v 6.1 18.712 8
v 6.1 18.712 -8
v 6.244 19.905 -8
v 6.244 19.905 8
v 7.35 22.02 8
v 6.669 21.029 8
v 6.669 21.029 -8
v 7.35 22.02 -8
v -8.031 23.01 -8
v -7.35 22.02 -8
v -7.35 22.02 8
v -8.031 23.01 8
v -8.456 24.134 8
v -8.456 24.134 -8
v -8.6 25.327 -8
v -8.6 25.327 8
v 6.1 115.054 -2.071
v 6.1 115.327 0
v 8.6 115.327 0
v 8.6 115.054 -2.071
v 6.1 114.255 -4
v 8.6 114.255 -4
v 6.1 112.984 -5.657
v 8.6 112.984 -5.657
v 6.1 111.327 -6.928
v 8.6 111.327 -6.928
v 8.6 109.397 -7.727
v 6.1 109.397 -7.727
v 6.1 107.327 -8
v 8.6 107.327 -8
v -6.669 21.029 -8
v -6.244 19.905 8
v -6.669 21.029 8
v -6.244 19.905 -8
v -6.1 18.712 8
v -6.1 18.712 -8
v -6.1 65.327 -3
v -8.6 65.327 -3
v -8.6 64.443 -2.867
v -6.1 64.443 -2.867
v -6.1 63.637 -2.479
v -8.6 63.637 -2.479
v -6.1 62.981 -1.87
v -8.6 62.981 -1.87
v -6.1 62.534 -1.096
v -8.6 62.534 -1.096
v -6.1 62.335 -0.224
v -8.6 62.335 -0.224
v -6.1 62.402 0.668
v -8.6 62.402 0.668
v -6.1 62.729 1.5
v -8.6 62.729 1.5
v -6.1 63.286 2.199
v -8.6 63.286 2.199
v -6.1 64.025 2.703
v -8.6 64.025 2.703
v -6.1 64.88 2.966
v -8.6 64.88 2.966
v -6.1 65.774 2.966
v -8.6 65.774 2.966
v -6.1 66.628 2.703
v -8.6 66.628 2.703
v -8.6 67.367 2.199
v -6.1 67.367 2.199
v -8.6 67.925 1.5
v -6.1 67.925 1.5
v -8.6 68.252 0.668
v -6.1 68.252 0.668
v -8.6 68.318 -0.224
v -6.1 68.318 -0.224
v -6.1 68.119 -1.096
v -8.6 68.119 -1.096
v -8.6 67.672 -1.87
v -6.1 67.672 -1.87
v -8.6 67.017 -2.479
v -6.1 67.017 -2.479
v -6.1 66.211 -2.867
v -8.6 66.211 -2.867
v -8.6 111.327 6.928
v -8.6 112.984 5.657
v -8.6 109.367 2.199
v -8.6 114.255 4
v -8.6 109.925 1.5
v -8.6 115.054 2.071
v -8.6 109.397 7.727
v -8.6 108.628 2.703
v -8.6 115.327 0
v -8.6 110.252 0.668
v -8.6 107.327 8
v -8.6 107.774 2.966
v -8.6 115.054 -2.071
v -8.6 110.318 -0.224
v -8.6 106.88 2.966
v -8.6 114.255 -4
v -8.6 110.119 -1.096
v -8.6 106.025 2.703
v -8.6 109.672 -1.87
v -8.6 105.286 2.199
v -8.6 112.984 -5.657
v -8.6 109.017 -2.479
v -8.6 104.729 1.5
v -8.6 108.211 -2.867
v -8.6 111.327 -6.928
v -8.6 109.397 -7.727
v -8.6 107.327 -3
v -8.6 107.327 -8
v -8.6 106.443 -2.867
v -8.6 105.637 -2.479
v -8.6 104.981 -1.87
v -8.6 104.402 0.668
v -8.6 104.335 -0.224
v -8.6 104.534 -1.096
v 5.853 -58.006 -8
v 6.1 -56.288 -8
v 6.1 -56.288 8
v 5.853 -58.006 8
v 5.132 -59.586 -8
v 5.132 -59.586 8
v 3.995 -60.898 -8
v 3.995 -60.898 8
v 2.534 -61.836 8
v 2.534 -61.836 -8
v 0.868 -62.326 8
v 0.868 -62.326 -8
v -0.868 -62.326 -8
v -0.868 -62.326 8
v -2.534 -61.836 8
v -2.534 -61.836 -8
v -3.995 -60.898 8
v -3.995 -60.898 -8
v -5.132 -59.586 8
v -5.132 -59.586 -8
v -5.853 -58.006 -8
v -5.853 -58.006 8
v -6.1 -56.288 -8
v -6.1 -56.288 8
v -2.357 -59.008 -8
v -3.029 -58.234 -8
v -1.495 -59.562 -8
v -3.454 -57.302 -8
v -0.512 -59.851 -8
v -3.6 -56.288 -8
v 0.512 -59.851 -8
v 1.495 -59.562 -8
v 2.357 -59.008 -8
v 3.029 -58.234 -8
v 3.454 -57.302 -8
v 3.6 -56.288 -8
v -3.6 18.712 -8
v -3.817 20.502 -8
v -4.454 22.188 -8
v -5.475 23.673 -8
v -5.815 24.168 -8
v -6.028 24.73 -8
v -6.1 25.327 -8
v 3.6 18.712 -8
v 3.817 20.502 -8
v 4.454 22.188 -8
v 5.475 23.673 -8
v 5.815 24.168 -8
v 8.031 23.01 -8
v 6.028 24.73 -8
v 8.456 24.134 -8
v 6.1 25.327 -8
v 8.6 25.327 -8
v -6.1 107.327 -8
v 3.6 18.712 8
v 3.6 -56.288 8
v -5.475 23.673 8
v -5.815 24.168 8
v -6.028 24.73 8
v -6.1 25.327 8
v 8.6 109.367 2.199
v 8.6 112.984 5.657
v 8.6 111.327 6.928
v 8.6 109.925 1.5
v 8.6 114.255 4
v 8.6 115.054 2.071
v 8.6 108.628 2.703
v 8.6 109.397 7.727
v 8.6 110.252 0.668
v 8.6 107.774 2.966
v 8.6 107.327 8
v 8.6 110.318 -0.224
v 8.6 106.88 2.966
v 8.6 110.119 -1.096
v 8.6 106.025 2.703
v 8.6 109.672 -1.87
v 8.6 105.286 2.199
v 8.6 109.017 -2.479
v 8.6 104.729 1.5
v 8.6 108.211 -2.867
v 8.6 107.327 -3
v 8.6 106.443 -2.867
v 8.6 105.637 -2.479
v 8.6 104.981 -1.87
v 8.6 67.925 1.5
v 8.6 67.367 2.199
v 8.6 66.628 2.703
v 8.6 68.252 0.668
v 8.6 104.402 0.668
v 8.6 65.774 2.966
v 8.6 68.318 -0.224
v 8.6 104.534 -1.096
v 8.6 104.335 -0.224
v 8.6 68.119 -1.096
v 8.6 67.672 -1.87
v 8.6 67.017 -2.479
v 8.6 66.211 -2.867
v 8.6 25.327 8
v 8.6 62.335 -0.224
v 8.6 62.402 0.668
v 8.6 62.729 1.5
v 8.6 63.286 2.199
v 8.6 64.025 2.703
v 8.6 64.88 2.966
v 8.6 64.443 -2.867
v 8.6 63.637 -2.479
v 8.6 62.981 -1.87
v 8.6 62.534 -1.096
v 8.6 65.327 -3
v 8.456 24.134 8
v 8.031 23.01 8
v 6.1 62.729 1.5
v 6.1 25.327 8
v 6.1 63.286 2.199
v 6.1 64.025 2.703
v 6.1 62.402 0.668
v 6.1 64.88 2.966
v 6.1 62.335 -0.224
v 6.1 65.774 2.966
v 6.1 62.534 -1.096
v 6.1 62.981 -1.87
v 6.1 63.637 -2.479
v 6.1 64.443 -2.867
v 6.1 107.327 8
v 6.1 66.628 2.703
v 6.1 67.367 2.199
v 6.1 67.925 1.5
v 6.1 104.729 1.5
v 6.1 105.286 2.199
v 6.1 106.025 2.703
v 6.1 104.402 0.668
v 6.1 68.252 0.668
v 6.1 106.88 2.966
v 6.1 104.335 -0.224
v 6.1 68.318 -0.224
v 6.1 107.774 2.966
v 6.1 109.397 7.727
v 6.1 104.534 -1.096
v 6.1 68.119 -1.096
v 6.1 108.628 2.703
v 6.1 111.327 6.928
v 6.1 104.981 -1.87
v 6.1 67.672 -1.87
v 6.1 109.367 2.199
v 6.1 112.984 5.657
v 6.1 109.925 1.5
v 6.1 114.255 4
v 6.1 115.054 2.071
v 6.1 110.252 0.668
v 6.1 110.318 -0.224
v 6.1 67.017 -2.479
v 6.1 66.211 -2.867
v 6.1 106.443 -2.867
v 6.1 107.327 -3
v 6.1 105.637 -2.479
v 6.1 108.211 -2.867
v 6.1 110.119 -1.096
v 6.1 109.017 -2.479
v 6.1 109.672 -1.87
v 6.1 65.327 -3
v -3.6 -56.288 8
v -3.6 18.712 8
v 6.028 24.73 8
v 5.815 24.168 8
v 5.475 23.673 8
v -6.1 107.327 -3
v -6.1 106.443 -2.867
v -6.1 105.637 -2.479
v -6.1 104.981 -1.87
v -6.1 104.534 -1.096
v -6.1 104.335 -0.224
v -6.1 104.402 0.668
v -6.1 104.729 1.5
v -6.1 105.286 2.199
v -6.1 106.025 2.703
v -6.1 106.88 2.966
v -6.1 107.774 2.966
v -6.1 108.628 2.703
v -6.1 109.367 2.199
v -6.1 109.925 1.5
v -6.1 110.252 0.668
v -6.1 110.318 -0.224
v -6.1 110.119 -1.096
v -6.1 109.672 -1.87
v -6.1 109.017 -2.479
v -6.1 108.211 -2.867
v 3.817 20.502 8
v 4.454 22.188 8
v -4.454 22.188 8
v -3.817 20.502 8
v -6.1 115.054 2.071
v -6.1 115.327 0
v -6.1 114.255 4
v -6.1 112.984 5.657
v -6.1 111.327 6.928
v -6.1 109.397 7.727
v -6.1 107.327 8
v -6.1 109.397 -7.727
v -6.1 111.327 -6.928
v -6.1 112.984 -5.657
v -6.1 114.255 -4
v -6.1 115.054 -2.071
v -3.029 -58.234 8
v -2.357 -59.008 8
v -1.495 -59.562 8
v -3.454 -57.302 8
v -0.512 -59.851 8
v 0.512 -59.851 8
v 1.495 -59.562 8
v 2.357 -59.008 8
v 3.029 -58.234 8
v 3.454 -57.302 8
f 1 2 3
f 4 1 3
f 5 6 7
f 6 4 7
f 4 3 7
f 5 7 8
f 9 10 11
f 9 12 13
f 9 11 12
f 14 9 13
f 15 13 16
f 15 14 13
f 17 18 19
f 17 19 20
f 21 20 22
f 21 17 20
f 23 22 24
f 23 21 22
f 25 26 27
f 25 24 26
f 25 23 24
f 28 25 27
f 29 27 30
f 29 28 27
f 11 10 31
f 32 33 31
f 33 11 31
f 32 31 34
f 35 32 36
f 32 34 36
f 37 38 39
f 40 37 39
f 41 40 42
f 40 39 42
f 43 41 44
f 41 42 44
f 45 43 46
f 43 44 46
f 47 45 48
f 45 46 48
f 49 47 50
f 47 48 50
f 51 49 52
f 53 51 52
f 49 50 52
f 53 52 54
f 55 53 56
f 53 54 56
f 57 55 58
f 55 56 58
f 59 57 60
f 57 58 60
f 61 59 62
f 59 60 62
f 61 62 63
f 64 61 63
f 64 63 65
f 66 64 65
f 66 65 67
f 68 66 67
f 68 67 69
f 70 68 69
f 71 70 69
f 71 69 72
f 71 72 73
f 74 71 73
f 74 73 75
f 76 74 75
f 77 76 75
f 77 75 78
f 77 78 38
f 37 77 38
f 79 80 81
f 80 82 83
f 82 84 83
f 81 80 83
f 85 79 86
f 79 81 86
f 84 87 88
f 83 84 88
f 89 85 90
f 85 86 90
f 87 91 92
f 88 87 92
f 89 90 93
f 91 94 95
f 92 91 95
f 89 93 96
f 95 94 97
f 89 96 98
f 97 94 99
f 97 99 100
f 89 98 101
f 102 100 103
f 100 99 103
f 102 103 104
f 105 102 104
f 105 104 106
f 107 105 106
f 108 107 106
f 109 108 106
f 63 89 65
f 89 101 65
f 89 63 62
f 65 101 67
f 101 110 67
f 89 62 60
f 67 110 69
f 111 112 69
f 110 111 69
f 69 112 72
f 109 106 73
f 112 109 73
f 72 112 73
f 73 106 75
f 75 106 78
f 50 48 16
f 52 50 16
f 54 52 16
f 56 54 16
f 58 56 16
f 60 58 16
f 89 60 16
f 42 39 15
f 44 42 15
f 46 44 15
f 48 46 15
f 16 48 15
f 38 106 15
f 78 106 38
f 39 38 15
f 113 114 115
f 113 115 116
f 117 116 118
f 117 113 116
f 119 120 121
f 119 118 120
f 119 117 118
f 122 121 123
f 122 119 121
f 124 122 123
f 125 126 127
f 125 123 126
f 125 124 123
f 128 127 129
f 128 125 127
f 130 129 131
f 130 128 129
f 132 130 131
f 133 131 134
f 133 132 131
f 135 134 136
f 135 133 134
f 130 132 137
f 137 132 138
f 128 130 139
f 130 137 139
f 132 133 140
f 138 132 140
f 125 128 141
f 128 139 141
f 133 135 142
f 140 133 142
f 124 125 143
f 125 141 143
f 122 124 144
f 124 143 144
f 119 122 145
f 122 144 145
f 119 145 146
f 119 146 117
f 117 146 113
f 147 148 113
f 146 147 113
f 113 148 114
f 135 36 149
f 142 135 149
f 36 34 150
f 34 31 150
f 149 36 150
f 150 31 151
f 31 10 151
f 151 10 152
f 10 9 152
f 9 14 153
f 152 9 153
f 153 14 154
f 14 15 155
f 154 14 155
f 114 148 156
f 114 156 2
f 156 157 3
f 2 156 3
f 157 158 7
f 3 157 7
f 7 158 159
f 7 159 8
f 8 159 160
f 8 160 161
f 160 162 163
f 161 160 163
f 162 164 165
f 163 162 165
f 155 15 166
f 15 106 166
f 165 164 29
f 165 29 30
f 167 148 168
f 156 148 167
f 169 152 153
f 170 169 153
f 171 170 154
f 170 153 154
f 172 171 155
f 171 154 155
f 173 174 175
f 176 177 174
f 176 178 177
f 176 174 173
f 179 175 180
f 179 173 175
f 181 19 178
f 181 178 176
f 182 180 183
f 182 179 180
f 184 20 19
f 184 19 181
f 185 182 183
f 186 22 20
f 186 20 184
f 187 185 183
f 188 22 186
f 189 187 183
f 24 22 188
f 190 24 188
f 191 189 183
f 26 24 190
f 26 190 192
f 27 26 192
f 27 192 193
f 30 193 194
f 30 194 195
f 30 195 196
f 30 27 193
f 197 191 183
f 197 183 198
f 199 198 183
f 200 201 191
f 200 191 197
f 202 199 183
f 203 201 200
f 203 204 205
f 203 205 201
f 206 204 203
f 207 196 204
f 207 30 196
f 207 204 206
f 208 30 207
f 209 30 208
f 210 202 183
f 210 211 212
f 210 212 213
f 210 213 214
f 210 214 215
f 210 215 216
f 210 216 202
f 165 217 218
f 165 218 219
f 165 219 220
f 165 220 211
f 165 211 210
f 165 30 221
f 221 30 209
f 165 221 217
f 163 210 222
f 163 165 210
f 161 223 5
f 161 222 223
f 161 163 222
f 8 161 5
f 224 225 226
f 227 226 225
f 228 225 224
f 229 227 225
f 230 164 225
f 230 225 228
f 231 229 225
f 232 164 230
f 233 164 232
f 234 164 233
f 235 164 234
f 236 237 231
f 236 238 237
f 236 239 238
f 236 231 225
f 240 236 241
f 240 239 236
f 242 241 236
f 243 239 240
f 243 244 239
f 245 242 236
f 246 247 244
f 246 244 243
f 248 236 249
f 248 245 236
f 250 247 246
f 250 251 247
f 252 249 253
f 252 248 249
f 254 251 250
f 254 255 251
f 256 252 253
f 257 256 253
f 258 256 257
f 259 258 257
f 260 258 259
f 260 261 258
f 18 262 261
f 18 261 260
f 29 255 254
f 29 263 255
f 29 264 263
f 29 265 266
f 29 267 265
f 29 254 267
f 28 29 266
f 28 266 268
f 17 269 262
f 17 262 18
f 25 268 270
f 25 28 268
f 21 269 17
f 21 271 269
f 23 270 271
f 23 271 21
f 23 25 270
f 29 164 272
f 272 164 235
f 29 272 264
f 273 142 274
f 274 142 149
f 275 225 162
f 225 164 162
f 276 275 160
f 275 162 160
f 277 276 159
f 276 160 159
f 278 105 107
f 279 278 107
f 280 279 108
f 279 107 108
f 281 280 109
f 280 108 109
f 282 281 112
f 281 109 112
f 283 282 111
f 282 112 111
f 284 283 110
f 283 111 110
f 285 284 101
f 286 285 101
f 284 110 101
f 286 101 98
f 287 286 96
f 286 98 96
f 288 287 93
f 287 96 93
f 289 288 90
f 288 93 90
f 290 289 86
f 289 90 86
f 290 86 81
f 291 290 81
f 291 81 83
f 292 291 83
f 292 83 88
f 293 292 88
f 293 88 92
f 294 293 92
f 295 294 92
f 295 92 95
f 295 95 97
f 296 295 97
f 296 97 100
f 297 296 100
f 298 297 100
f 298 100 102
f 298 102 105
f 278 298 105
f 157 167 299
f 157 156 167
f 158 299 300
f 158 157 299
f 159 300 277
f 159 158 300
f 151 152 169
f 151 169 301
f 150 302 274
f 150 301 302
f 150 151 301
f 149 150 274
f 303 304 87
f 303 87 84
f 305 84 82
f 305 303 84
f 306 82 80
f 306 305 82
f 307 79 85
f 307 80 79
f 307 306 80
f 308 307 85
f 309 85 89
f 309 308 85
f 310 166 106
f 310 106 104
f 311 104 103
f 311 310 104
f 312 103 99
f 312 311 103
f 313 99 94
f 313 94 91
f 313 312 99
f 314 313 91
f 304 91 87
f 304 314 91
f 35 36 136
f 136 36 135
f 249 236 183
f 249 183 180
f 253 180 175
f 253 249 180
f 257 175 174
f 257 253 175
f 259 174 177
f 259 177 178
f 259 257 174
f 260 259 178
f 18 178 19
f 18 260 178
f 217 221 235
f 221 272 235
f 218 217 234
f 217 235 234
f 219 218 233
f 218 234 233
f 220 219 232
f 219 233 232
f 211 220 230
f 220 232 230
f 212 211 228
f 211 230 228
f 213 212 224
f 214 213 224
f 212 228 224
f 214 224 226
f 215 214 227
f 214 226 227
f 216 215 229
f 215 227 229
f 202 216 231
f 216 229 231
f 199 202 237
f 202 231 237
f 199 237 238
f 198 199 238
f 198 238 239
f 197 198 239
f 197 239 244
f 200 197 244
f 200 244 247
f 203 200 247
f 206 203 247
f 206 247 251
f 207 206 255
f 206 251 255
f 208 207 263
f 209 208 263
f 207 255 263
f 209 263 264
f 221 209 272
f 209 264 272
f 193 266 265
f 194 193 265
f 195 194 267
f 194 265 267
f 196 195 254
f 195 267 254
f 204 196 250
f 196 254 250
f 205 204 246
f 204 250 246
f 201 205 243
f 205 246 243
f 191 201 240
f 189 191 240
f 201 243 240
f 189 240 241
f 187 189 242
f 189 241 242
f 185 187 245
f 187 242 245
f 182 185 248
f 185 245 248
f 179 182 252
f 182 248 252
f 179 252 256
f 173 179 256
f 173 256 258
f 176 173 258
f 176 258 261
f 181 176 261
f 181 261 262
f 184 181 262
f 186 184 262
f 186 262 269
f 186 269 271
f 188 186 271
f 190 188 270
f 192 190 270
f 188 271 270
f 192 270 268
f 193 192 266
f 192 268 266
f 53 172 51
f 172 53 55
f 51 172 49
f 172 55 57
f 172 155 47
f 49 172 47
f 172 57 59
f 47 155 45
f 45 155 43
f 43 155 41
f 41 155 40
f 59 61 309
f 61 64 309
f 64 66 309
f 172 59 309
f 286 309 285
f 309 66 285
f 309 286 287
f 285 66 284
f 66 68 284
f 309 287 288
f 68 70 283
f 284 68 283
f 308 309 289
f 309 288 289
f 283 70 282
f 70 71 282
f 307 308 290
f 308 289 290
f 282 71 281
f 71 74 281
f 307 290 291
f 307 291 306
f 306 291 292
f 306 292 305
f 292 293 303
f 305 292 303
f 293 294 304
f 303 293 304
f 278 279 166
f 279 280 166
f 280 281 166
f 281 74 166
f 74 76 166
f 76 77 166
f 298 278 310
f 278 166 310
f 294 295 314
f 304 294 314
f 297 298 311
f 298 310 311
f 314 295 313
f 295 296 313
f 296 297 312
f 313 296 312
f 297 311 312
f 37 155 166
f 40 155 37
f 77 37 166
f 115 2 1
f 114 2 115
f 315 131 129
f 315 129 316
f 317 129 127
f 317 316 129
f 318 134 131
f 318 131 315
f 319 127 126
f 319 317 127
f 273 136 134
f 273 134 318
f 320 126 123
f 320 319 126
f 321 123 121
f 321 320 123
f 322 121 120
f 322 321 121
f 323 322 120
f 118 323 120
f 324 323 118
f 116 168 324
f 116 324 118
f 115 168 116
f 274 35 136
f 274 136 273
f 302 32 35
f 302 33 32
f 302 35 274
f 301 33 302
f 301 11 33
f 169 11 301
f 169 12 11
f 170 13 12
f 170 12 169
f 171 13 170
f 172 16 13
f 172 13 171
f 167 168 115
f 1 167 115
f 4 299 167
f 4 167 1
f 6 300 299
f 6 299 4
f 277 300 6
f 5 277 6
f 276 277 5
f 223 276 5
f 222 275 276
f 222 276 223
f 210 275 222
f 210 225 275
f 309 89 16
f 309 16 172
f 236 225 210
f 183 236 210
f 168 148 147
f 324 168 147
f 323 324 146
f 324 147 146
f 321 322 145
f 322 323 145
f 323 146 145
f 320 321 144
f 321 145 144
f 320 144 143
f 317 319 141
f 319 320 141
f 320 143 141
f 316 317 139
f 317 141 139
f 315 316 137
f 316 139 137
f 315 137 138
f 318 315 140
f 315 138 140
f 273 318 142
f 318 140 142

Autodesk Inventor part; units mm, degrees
ref_plane "YZ Plane" through (0, 0, 0) normal (1, 0, 0) x (0, 1, 0)
ref_plane "XZ Plane" through (0, 0, 0) normal (0, 1, 0) x (-1, 0, 0)
ref_plane "XY Plane" through (0, 0, 0) normal (0, 0, 1) x (1, 0, 0)
sketch "Sketch1" plane through (0, 0, 0) normal (0, 0, 1) x (1, 0, 0)
  line L0 (0, 104.6011) -> (0, -104.6011)
  line L1 (-8.6, 115.3268) -> (-8.6, 25.3268)
  arc A0 (-8.6, 25.3268) -> (-7.35, 22.0196) centre (-3.6, 25.3268) ccw
  arc A1 (-6.1, 18.7124) -> (-7.35, 22.0196) centre (-11.1, 18.7124) ccw
  line L2 (-6.1, 18.7124) -> (-6.1, -56.2876)
  arc A2 (-6.1, -56.2876) -> (0, -62.3876) centre (0, -56.2876) ccw
  arc A3 (-3.6, -56.2876) -> (0, -59.8876) centre (0, -56.2876) ccw
  line L3 (-3.6, -56.2876) -> (-3.6, 18.7124)
  arc A4 (-3.6, 18.7124) -> (-5.475, 23.6732) centre (-11.1, 18.7124) ccw
  arc A5 (-6.1, 25.3268) -> (-5.475, 23.6732) centre (-3.6, 25.3268) ccw
  line L4 (-6.1, 25.3268) -> (-6.1, 115.3268)
  line L5 (-8.6, 115.3268) -> (-6.1, 115.3268)
  line L6 (8.6, 115.3268) -> (8.6, 25.3268)
  arc A6 (7.35, 22.0196) -> (8.6, 25.3268) centre (3.6, 25.3268) ccw
  arc A7 (7.35, 22.0196) -> (6.1, 18.7124) centre (11.1, 18.7124) ccw
  line L7 (6.1, 18.7124) -> (6.1, -56.2876)
  arc A8 (0, -62.3876) -> (6.1, -56.2876) centre (0, -56.2876) ccw
  arc A9 (0, -59.8876) -> (3.6, -56.2876) centre (0, -56.2876) ccw
  line L8 (3.6, -56.2876) -> (3.6, 18.7124)
  arc A10 (5.475, 23.6732) -> (3.6, 18.7124) centre (11.1, 18.7124) ccw
  arc A11 (5.475, 23.6732) -> (6.1, 25.3268) centre (3.6, 25.3268) ccw
  line L9 (6.1, 25.3268) -> (6.1, 115.3268)
  line L10 (8.6, 115.3268) -> (6.1, 115.3268)
  point P0 (0, 0)
  point P1 (0, 0)
  dimension "d0" = 90
  dimension "d1" = 5
  dimension "d2" = 75
  dimension "d3" = 6.1
  dimension "d4" = 6.1
  dimension "d5" = 8.6
  dimension "d6" = 2.5
extrude "Extrusion1" add sketch "Sketch1" along normal mid plane 16
hole "Hole1" at (8.6, 107.3268, 0) direction (-1, 0, 0) diameter 6 depth 30 tip angle 118
hole "Hole2" at (8.6, 65.3268, 0) direction (-1, 0, 0) diameter 6 depth 30 tip angle 118
fillet "Fillet1" radius 8 4 edges at (7.35, 115.3268, -8) (7.35, 115.3268, 8) (-7.35, 115.3268, 8) (-7.35, 115.3268, -8)
equation "\"BendRadius\" = Thickness"
equation "\"BendReliefWidth\" = Thickness"
equation "\"BendReliefDepth\" = 0.5 * Thickness"
equation "\"MinimumRemnant\" = 2 * Thickness"
equation "\"TransitionRadius\" = BendRadius"
equation "\"JacobiRadiusSize\" = BendRadius"
equation "\"GapSize\" = Thickness"
equation "\"Thickness\" = 2.5"
properties material "Iron, Gray"
